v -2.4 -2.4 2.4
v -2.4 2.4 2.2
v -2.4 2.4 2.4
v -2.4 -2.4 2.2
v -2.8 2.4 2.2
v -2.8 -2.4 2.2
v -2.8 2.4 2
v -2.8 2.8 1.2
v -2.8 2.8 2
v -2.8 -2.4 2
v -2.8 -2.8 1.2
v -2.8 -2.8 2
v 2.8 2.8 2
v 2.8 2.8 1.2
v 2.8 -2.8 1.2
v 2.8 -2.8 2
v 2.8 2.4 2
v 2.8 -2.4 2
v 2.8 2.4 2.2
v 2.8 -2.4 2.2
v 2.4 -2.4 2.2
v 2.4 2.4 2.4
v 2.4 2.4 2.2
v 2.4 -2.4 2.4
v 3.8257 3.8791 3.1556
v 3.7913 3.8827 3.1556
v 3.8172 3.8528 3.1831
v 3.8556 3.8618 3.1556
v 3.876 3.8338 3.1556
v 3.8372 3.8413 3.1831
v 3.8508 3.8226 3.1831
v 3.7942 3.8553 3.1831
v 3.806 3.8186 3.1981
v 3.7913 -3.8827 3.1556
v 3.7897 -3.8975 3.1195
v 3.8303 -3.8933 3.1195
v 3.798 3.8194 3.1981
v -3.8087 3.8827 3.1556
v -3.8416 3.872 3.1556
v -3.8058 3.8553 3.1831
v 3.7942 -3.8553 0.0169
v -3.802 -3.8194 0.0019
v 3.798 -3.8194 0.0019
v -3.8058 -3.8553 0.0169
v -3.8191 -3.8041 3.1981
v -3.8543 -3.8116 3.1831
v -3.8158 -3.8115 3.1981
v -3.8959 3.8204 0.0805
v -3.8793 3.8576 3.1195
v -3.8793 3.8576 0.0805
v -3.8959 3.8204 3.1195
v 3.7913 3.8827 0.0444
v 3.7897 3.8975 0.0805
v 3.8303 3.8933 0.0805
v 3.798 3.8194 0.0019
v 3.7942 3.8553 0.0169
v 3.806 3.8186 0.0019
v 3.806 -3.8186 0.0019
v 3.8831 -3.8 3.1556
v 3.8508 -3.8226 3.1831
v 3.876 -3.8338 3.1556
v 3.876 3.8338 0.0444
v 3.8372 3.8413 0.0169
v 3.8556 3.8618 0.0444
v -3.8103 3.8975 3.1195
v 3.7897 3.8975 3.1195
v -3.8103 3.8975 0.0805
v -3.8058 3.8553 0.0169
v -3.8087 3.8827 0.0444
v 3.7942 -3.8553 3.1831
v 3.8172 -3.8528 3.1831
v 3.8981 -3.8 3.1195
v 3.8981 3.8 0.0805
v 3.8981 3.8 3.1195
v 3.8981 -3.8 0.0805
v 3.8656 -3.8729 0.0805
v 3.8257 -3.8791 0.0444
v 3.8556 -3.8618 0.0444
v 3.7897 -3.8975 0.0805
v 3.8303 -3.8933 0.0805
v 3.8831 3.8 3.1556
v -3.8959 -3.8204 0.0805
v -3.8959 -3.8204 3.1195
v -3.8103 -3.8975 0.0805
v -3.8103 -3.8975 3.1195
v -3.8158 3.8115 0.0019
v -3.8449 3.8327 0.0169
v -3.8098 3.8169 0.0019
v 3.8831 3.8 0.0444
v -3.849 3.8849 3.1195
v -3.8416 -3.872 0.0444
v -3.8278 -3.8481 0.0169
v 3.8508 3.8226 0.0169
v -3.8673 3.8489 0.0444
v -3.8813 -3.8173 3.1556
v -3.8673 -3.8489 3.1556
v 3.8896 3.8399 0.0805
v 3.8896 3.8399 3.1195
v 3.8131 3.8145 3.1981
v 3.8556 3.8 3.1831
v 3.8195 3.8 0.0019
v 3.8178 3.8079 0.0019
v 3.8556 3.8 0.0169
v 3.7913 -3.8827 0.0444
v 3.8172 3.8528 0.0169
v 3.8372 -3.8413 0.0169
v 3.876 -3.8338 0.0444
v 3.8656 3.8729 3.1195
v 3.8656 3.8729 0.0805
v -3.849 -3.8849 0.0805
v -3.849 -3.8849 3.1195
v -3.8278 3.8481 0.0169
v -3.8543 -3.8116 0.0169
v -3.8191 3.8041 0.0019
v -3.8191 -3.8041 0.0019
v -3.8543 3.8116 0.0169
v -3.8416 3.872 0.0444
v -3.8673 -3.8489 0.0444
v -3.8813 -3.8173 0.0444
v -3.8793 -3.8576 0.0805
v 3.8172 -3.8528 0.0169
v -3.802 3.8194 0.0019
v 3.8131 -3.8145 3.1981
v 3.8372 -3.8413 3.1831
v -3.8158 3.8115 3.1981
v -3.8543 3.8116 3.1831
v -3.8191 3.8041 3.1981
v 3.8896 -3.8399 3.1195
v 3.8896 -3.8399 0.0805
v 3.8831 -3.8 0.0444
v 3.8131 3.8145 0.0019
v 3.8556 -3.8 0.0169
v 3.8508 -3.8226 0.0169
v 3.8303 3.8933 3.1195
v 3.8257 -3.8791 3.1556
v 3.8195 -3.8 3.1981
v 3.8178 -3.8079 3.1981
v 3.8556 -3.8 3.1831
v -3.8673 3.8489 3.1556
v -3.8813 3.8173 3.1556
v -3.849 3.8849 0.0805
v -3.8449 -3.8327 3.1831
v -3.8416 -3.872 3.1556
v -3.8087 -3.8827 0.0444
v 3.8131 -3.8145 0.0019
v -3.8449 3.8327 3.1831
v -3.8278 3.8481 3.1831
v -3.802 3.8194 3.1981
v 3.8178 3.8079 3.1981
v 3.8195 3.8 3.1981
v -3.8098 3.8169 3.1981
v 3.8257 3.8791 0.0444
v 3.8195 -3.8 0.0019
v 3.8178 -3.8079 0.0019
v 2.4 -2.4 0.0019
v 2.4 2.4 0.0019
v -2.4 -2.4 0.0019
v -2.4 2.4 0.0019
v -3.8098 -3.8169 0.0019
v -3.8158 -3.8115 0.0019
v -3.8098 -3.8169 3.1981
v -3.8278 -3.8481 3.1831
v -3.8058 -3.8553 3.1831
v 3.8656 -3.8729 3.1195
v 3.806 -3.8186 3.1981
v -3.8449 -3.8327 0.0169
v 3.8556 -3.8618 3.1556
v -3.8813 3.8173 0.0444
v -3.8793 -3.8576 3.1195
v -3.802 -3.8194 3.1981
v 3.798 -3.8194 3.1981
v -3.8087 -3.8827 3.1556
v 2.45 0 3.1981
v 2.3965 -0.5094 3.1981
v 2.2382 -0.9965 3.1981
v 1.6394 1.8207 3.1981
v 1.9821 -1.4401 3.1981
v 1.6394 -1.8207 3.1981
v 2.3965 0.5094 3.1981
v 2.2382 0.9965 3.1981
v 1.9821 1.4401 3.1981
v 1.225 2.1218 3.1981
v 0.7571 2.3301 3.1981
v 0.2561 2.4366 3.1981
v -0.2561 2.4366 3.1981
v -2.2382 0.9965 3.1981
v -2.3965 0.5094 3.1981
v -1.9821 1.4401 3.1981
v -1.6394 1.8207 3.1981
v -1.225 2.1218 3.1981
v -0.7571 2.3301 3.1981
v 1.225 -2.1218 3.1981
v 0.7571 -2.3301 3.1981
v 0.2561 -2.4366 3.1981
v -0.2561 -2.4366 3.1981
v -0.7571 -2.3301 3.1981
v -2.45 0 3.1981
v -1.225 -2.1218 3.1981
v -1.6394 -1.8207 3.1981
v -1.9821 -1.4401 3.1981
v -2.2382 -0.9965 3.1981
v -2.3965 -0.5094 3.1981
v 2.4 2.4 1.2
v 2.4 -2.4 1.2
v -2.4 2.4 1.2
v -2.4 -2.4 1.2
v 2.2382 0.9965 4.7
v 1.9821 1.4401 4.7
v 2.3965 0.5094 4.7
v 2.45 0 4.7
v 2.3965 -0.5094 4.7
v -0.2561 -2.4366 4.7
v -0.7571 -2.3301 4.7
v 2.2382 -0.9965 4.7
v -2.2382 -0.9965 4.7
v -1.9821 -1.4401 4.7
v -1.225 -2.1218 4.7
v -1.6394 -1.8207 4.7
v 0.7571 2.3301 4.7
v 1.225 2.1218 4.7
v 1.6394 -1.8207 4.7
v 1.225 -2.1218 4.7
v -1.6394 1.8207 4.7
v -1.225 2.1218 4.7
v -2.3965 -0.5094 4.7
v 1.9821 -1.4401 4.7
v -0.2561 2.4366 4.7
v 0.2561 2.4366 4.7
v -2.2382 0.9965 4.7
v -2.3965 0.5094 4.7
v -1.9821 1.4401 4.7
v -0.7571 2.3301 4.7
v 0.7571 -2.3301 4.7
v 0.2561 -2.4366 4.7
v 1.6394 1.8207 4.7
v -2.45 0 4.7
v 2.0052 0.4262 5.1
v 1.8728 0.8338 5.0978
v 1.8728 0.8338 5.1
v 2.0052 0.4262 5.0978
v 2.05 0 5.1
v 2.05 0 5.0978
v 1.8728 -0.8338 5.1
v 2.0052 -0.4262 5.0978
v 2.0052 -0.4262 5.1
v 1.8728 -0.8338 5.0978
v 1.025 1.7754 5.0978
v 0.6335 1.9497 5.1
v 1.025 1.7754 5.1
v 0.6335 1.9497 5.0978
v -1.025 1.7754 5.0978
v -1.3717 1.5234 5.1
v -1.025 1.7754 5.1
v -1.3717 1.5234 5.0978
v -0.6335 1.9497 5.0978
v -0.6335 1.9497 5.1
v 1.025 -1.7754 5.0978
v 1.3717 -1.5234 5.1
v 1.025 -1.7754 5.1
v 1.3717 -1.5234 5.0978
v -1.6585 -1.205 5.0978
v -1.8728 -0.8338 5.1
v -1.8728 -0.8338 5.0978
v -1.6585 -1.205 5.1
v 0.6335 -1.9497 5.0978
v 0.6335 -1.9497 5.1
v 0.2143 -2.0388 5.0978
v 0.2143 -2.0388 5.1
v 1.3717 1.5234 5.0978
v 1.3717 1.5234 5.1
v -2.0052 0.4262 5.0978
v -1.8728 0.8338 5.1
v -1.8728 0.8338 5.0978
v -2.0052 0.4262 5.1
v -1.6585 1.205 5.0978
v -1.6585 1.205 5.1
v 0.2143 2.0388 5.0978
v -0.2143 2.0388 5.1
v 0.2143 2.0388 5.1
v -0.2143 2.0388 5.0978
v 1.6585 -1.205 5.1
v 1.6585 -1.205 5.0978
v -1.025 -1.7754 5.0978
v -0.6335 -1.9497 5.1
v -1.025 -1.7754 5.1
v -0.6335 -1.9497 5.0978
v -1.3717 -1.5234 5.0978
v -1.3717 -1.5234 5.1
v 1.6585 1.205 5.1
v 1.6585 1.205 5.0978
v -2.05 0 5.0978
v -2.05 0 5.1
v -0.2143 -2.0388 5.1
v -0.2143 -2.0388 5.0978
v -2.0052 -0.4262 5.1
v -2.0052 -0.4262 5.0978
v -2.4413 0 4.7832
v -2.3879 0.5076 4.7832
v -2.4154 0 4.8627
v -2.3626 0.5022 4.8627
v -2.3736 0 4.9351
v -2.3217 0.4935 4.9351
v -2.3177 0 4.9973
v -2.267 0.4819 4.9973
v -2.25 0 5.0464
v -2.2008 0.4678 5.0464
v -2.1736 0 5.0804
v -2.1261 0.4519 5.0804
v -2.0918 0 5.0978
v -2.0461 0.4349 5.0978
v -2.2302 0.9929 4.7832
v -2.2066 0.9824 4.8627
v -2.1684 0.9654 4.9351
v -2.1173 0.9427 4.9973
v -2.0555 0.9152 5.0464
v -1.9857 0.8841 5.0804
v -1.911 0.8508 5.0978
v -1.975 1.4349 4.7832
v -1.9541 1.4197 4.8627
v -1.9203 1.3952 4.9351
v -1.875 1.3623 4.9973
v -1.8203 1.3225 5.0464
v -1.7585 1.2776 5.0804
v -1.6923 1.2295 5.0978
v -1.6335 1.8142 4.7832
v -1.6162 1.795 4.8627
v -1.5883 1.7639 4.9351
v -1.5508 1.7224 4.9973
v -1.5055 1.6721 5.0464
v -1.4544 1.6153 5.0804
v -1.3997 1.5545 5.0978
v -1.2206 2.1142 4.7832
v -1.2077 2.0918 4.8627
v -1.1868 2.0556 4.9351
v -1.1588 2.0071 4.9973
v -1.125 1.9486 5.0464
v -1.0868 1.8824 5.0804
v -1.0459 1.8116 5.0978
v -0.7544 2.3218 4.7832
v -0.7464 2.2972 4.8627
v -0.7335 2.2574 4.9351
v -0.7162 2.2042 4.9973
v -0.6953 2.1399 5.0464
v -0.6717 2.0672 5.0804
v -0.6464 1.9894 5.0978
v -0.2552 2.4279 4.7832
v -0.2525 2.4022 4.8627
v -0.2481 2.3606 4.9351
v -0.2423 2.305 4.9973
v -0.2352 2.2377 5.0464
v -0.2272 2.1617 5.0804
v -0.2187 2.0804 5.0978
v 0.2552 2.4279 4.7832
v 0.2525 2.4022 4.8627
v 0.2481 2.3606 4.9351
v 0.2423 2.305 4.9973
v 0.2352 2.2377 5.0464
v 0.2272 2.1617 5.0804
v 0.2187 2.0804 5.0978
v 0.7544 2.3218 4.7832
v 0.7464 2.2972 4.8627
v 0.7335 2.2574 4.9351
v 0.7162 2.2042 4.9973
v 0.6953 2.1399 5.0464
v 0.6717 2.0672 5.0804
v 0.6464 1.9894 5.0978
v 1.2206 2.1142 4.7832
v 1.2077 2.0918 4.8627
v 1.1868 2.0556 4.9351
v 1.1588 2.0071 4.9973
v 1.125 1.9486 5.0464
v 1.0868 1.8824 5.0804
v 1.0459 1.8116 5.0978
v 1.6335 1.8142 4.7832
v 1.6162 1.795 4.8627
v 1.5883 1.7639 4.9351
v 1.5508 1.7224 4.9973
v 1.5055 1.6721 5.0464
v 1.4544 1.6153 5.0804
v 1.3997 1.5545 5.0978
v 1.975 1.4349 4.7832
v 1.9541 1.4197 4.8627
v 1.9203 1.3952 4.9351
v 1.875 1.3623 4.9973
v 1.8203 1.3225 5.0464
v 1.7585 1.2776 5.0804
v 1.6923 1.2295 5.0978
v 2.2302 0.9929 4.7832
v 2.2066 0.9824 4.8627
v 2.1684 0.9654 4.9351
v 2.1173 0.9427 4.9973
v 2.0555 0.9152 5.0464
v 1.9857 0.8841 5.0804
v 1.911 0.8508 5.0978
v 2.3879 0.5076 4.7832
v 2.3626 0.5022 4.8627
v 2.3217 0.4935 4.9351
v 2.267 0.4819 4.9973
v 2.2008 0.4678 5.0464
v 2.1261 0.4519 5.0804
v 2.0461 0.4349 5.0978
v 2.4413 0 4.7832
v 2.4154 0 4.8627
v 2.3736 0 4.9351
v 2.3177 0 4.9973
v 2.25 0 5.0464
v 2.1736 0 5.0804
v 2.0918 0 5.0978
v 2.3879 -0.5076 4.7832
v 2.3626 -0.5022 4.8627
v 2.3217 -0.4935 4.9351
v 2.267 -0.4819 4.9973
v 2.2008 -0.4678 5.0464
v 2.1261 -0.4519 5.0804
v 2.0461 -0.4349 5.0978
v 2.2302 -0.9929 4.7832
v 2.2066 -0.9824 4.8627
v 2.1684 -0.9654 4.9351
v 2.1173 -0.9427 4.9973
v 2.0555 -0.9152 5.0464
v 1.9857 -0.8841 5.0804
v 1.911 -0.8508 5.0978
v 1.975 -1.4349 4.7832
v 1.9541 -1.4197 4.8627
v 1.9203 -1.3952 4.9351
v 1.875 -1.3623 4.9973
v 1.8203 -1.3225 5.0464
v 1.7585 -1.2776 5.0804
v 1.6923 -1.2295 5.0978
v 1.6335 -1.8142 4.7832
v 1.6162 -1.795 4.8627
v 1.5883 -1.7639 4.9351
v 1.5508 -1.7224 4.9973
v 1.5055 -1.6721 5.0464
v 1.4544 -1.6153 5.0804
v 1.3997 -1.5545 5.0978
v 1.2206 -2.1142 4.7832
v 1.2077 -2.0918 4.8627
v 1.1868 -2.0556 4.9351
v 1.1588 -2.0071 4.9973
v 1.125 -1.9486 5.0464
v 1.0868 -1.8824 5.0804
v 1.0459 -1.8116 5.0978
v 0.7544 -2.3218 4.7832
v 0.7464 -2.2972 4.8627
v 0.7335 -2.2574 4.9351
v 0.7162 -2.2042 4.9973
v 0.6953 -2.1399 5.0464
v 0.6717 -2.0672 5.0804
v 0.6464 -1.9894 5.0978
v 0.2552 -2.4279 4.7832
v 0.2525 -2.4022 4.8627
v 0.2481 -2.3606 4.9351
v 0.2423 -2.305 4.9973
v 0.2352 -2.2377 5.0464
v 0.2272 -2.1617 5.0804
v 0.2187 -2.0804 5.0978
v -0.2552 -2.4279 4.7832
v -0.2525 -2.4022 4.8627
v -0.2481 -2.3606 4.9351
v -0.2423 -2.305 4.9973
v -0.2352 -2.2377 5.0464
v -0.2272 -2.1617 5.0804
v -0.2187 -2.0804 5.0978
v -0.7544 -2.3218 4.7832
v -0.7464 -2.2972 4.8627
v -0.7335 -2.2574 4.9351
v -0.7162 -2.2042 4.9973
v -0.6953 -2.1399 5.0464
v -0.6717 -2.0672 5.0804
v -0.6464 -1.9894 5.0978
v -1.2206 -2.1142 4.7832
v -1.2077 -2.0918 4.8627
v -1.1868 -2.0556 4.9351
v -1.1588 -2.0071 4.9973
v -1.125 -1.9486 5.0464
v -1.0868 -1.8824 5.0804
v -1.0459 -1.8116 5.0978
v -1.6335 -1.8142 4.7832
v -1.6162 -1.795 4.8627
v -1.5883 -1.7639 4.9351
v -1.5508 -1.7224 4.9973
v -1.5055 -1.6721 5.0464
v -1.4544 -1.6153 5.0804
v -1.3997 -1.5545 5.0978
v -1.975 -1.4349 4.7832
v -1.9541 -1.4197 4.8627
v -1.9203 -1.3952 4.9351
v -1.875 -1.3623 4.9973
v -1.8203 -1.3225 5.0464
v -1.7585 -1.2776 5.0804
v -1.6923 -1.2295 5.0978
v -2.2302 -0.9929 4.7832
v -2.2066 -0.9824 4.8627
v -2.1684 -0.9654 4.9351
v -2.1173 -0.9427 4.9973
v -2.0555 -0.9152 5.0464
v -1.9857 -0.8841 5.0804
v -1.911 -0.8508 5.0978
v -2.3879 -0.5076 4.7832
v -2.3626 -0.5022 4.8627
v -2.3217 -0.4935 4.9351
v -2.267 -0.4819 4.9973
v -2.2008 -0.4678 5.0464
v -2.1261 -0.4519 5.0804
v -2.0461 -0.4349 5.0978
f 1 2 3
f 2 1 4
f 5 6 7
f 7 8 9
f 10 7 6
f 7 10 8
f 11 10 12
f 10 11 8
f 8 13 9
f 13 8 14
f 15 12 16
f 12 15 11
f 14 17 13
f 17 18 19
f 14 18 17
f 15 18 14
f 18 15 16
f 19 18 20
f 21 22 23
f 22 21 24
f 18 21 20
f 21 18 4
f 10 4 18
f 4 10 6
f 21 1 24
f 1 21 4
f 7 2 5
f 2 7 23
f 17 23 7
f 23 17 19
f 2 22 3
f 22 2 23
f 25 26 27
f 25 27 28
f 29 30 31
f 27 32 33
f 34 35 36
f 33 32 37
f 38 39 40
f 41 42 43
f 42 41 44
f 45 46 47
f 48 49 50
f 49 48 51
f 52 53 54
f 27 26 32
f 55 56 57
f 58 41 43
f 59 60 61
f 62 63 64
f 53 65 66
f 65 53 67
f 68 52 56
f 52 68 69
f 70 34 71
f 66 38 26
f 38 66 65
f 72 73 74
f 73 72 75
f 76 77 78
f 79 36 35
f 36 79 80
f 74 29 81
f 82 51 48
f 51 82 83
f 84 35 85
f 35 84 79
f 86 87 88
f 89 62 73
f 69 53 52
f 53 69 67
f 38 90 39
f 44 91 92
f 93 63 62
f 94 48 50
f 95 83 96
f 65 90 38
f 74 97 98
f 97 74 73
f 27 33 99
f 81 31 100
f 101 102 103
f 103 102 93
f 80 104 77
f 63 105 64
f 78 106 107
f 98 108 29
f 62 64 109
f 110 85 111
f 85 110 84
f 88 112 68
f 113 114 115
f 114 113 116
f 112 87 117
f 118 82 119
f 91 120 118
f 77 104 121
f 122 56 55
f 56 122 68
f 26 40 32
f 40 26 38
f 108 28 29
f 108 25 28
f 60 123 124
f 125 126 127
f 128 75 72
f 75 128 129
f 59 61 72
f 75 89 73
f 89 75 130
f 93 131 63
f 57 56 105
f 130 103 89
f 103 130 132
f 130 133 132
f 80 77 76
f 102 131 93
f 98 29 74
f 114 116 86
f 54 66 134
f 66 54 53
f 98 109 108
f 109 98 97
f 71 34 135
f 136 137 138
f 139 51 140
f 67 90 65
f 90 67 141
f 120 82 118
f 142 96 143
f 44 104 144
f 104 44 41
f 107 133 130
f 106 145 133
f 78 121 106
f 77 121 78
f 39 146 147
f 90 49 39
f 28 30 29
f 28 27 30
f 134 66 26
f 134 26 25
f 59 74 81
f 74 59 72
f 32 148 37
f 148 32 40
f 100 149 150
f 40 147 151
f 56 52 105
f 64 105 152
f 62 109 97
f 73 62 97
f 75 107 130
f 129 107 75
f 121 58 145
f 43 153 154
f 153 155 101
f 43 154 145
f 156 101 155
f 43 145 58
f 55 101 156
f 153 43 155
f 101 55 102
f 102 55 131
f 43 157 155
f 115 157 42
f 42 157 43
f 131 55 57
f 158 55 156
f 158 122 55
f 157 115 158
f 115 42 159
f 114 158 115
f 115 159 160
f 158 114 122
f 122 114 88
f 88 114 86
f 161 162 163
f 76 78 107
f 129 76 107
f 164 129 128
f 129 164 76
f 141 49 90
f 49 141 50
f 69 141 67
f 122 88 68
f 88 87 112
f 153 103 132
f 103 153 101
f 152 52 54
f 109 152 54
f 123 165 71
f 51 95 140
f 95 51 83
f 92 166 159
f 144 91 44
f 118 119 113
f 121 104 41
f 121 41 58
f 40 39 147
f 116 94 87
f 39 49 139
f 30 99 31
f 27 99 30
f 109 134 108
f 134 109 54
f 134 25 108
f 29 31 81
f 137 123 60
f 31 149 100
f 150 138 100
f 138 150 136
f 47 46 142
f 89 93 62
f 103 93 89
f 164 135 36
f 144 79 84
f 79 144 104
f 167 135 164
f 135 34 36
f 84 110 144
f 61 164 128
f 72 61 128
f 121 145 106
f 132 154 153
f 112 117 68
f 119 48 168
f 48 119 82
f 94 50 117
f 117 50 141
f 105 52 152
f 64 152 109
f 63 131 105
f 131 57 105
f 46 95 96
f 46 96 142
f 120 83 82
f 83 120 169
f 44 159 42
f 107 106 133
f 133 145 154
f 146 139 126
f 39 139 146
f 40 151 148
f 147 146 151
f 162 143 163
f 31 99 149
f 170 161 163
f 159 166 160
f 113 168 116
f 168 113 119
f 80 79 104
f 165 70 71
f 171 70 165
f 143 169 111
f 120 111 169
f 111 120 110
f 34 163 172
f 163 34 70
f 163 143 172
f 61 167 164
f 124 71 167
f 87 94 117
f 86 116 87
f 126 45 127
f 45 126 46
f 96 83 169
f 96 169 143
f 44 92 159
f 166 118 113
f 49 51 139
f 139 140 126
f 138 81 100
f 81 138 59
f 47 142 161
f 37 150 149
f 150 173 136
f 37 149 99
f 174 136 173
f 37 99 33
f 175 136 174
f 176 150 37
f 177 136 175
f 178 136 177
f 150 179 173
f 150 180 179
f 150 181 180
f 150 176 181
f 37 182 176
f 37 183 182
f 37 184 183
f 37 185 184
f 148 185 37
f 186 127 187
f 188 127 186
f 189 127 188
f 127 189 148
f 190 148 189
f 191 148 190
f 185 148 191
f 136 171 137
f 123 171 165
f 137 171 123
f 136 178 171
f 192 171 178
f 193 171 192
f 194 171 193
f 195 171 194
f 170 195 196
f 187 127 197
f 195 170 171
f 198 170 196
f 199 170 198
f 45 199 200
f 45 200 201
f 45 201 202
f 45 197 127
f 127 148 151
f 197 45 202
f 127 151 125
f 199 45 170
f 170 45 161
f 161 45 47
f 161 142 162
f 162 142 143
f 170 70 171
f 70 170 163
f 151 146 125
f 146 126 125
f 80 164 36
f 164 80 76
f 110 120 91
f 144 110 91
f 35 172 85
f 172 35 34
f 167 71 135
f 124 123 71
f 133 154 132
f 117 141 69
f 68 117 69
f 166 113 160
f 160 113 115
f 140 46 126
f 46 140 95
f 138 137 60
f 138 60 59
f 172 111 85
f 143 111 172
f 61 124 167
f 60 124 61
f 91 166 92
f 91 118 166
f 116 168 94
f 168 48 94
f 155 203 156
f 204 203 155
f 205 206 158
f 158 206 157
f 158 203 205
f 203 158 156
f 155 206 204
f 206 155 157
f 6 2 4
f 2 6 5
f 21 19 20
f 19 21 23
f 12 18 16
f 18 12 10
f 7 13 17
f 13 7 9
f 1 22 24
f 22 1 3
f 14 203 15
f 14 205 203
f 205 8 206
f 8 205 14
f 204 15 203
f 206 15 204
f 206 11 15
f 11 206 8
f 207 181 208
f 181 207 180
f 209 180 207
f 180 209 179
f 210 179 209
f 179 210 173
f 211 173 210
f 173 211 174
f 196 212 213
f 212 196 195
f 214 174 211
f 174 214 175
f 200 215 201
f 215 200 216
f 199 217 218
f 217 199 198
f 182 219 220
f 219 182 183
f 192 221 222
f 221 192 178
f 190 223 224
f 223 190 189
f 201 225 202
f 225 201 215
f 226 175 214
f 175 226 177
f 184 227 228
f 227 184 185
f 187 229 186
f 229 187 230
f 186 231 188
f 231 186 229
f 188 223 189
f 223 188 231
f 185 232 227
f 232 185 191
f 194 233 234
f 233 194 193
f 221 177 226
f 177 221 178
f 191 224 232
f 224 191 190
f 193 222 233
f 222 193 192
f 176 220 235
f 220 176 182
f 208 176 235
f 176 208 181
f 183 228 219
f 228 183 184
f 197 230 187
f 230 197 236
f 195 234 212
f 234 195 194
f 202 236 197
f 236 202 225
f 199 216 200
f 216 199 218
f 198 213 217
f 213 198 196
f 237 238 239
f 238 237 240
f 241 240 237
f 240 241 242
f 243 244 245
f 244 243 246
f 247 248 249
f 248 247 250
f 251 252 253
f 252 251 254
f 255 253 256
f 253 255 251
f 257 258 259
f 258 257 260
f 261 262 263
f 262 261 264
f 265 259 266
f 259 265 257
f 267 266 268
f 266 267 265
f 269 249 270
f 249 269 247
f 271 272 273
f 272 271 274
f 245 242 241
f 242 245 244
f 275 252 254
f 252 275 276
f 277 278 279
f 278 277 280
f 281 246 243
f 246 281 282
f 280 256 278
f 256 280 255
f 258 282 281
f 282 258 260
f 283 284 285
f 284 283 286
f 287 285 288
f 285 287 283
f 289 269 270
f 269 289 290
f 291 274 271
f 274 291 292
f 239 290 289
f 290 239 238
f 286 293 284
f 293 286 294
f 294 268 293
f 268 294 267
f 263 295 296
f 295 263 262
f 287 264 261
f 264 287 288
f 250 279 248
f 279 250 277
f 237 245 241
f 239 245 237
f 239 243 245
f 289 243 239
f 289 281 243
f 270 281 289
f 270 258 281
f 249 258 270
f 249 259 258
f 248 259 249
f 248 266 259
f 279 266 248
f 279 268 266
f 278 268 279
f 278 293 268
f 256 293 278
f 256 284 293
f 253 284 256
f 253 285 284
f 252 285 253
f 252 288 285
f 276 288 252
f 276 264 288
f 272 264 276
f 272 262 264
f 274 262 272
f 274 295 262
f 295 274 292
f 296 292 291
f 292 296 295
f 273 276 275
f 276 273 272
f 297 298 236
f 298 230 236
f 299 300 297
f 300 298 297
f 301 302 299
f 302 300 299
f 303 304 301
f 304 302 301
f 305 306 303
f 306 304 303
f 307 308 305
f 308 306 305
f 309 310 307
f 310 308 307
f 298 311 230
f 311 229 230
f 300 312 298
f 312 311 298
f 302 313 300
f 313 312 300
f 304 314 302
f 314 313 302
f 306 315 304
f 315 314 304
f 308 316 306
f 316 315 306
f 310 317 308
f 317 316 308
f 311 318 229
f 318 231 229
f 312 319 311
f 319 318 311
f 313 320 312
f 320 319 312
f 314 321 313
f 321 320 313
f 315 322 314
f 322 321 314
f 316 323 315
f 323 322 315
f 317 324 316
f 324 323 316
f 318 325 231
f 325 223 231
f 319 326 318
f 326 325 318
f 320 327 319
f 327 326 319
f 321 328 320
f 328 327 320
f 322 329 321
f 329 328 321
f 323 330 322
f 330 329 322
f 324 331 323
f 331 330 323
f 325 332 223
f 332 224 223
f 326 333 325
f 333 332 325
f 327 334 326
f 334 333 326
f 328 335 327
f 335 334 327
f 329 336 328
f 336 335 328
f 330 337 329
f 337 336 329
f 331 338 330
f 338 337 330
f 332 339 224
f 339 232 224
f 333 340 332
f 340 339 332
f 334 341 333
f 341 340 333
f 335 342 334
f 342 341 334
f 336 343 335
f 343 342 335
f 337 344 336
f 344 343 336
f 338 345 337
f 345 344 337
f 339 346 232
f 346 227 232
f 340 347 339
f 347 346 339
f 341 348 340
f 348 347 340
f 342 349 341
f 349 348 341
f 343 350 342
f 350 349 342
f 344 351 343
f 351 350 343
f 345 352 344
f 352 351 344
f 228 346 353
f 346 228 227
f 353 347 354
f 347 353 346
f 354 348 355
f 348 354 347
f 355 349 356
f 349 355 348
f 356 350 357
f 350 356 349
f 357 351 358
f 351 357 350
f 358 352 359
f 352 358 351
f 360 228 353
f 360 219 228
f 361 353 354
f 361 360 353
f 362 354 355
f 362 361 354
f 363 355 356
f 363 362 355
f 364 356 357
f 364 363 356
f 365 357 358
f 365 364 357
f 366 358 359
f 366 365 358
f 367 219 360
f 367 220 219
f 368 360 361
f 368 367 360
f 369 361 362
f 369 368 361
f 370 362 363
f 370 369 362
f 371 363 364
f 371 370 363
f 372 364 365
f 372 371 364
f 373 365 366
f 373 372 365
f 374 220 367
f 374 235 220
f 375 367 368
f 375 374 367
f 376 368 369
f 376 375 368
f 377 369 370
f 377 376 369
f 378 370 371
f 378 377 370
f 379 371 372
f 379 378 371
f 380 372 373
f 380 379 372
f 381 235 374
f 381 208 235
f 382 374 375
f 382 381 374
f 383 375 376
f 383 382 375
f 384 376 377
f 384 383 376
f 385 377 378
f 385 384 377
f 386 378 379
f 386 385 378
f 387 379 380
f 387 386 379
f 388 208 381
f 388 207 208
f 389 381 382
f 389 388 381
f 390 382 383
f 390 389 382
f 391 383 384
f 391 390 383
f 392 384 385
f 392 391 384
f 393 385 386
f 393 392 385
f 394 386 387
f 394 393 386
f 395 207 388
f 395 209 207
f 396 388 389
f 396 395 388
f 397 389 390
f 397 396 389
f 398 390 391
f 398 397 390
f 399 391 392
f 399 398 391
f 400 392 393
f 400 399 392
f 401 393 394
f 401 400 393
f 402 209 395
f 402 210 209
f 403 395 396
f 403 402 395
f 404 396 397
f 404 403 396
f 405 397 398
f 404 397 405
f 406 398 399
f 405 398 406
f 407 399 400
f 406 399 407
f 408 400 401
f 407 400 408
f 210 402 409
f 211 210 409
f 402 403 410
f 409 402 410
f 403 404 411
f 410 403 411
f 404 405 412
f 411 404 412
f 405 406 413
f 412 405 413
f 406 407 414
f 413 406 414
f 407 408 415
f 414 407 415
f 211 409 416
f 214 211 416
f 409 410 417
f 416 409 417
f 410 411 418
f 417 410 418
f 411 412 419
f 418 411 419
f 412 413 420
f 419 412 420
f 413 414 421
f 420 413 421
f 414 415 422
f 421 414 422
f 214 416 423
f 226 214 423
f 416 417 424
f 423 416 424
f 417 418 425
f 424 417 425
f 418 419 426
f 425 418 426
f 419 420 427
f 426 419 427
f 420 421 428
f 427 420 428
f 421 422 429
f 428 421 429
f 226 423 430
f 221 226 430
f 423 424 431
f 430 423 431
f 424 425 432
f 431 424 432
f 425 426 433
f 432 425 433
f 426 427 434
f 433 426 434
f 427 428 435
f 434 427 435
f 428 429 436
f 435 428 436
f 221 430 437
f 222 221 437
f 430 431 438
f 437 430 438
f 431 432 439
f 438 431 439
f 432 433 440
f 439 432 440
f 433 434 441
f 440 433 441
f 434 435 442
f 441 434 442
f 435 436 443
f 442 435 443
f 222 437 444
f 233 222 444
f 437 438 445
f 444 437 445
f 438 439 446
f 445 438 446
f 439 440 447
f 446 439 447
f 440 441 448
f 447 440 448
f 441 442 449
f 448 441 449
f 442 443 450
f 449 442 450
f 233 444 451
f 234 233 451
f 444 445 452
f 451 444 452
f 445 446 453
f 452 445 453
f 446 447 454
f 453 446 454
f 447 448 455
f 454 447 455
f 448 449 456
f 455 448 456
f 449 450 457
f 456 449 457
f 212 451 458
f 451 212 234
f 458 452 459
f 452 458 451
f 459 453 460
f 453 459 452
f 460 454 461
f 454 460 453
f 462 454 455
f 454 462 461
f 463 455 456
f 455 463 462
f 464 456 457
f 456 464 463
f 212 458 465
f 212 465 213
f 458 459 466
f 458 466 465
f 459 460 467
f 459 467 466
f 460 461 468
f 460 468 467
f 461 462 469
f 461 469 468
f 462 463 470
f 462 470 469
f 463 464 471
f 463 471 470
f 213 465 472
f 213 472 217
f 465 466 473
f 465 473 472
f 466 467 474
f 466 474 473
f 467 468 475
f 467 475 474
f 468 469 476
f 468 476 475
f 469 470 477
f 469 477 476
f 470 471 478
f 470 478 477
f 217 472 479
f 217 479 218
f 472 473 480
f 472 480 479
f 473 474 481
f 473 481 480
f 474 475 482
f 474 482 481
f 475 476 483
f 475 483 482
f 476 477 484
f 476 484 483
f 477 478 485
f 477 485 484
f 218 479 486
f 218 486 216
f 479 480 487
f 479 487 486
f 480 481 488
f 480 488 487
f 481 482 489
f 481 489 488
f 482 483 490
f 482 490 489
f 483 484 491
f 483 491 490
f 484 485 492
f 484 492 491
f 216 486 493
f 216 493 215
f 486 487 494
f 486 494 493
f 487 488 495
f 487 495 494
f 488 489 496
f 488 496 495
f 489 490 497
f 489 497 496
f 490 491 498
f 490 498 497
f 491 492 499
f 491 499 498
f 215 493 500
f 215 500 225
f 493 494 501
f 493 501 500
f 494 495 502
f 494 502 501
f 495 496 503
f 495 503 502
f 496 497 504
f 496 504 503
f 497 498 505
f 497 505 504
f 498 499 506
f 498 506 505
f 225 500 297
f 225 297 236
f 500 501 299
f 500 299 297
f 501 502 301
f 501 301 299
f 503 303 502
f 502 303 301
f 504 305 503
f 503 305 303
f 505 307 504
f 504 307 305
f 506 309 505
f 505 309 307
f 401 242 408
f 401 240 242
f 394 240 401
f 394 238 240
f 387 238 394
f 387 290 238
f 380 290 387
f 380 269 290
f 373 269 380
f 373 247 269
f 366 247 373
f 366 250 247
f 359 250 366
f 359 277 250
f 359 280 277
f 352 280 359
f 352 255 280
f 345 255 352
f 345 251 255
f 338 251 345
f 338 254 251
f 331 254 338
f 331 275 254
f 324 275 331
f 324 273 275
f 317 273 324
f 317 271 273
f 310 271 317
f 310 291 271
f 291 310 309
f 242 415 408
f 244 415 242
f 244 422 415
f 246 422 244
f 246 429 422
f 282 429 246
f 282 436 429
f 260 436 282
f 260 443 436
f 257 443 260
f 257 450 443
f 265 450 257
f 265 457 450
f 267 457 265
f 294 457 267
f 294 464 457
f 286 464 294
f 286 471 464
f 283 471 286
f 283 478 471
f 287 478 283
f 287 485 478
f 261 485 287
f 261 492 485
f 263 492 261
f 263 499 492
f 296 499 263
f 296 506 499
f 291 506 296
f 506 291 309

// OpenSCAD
// file: ../../lib/roundedcube_simple.scad
/**
* Machine Blocks
* https://machinemania.net/blocks 
*
* Module for simple rounded cubes
* Copyright (c) 2022 Jan Philipp Knoeller <pk@pksoftware.de>
*
* Published under license:
* Creative Commons Attribution-NonCommercial-ShareAlike 4.0 International 
* https://creativecommons.org/licenses/by-nc-sa/4.0/
*
*/
module roundedcube_simple(size = [1, 1, 1], center = false, radius = 0.5, resolution = 20) {
	// If single value, convert to [x, y, z] vector
	size = (size[0] == undef) ? [size, size, size] : size;

	translate = (center == false) ?
		[radius, radius, radius] :
		[
			radius - (size[0] / 2),
			radius - (size[1] / 2),
			radius - (size[2] / 2)
	];

	translate(v = translate)
	minkowski() {
		cube(size = [
			size[0] - (radius * 2),
			size[1] - (radius * 2),
			size[2] - (radius * 2)
		]);
		sphere(r = radius, $fn = resolution);
	}
}
// file: ../../lib/roundedcube.scad
// More information: https://danielupshaw.com/openscad-rounded-corners/

// Set to 0.01 for higher definition curves (renders slower)
$fs = 0.15;

module roundedcube(size = [1, 1, 1], center = false, radius = 0.5, apply_to = "all", resolution = 20) {
	// If single value, convert to [x, y, z] vector
	size = (size[0] == undef) ? [size, size, size] : size;

	translate_min = radius;
	translate_xmax = size[0] - radius;
	translate_ymax = size[1] - radius;
	translate_zmax = size[2] - radius;

	diameter = radius * 2;

	obj_translate = (center == false) ?
		[0, 0, 0] : [
			-(size[0] / 2),
			-(size[1] / 2),
			-(size[2] / 2)
		];

	translate(v = obj_translate) {
		hull() {
			for (translate_x = [translate_min, translate_xmax]) {
				x_at = (translate_x == translate_min) ? "min" : "max";
				for (translate_y = [translate_min, translate_ymax]) {
					y_at = (translate_y == translate_min) ? "min" : "max";
					for (translate_z = [translate_min, translate_zmax]) {
						z_at = (translate_z == translate_min) ? "min" : "max";

						translate(v = [translate_x, translate_y, translate_z])
						if (
							(apply_to == "all") ||
							(apply_to == "xmin" && x_at == "min") || (apply_to == "xmax" && x_at == "max") ||
							(apply_to == "ymin" && y_at == "min") || (apply_to == "ymax" && y_at == "max") ||
							(apply_to == "zmin" && z_at == "min") || (apply_to == "zmax" && z_at == "max")
						) {
							sphere(r = radius, $fn = resolution);
						} else {
							rotate = 
								(apply_to == "xmin" || apply_to == "xmax" || apply_to == "x") ? [0, 90, 0] : (
								(apply_to == "ymin" || apply_to == "ymax" || apply_to == "y") ? [90, 90, 0] :
								[0, 0, 0]
							);
							rotate(a = rotate)
							cylinder(h = diameter, r = radius, center = true, $fn = resolution);
						}
					}
				}
			}
		}
	}
}
// main file
/**
* Machine Blocks
* https://machinemania.net/blocks 
*
* Plate 1x1
* Copyright (c) 2022 Jan Philipp Knoeller <pk@pksoftware.de>
*
* Published under license:
* Creative Commons Attribution-NonCommercial-ShareAlike 4.0 International 
* https://creativecommons.org/licenses/by-nc-sa/4.0/
*
*/
echo(version=version());

include <../../lib/block-v2.scad>;

color([0.376, 0.768, 0.058])
block(grid=[1,1], withKnobs=false);


block(grid=[1,1], baseHeight=3.0, knobHeight=2.1);
